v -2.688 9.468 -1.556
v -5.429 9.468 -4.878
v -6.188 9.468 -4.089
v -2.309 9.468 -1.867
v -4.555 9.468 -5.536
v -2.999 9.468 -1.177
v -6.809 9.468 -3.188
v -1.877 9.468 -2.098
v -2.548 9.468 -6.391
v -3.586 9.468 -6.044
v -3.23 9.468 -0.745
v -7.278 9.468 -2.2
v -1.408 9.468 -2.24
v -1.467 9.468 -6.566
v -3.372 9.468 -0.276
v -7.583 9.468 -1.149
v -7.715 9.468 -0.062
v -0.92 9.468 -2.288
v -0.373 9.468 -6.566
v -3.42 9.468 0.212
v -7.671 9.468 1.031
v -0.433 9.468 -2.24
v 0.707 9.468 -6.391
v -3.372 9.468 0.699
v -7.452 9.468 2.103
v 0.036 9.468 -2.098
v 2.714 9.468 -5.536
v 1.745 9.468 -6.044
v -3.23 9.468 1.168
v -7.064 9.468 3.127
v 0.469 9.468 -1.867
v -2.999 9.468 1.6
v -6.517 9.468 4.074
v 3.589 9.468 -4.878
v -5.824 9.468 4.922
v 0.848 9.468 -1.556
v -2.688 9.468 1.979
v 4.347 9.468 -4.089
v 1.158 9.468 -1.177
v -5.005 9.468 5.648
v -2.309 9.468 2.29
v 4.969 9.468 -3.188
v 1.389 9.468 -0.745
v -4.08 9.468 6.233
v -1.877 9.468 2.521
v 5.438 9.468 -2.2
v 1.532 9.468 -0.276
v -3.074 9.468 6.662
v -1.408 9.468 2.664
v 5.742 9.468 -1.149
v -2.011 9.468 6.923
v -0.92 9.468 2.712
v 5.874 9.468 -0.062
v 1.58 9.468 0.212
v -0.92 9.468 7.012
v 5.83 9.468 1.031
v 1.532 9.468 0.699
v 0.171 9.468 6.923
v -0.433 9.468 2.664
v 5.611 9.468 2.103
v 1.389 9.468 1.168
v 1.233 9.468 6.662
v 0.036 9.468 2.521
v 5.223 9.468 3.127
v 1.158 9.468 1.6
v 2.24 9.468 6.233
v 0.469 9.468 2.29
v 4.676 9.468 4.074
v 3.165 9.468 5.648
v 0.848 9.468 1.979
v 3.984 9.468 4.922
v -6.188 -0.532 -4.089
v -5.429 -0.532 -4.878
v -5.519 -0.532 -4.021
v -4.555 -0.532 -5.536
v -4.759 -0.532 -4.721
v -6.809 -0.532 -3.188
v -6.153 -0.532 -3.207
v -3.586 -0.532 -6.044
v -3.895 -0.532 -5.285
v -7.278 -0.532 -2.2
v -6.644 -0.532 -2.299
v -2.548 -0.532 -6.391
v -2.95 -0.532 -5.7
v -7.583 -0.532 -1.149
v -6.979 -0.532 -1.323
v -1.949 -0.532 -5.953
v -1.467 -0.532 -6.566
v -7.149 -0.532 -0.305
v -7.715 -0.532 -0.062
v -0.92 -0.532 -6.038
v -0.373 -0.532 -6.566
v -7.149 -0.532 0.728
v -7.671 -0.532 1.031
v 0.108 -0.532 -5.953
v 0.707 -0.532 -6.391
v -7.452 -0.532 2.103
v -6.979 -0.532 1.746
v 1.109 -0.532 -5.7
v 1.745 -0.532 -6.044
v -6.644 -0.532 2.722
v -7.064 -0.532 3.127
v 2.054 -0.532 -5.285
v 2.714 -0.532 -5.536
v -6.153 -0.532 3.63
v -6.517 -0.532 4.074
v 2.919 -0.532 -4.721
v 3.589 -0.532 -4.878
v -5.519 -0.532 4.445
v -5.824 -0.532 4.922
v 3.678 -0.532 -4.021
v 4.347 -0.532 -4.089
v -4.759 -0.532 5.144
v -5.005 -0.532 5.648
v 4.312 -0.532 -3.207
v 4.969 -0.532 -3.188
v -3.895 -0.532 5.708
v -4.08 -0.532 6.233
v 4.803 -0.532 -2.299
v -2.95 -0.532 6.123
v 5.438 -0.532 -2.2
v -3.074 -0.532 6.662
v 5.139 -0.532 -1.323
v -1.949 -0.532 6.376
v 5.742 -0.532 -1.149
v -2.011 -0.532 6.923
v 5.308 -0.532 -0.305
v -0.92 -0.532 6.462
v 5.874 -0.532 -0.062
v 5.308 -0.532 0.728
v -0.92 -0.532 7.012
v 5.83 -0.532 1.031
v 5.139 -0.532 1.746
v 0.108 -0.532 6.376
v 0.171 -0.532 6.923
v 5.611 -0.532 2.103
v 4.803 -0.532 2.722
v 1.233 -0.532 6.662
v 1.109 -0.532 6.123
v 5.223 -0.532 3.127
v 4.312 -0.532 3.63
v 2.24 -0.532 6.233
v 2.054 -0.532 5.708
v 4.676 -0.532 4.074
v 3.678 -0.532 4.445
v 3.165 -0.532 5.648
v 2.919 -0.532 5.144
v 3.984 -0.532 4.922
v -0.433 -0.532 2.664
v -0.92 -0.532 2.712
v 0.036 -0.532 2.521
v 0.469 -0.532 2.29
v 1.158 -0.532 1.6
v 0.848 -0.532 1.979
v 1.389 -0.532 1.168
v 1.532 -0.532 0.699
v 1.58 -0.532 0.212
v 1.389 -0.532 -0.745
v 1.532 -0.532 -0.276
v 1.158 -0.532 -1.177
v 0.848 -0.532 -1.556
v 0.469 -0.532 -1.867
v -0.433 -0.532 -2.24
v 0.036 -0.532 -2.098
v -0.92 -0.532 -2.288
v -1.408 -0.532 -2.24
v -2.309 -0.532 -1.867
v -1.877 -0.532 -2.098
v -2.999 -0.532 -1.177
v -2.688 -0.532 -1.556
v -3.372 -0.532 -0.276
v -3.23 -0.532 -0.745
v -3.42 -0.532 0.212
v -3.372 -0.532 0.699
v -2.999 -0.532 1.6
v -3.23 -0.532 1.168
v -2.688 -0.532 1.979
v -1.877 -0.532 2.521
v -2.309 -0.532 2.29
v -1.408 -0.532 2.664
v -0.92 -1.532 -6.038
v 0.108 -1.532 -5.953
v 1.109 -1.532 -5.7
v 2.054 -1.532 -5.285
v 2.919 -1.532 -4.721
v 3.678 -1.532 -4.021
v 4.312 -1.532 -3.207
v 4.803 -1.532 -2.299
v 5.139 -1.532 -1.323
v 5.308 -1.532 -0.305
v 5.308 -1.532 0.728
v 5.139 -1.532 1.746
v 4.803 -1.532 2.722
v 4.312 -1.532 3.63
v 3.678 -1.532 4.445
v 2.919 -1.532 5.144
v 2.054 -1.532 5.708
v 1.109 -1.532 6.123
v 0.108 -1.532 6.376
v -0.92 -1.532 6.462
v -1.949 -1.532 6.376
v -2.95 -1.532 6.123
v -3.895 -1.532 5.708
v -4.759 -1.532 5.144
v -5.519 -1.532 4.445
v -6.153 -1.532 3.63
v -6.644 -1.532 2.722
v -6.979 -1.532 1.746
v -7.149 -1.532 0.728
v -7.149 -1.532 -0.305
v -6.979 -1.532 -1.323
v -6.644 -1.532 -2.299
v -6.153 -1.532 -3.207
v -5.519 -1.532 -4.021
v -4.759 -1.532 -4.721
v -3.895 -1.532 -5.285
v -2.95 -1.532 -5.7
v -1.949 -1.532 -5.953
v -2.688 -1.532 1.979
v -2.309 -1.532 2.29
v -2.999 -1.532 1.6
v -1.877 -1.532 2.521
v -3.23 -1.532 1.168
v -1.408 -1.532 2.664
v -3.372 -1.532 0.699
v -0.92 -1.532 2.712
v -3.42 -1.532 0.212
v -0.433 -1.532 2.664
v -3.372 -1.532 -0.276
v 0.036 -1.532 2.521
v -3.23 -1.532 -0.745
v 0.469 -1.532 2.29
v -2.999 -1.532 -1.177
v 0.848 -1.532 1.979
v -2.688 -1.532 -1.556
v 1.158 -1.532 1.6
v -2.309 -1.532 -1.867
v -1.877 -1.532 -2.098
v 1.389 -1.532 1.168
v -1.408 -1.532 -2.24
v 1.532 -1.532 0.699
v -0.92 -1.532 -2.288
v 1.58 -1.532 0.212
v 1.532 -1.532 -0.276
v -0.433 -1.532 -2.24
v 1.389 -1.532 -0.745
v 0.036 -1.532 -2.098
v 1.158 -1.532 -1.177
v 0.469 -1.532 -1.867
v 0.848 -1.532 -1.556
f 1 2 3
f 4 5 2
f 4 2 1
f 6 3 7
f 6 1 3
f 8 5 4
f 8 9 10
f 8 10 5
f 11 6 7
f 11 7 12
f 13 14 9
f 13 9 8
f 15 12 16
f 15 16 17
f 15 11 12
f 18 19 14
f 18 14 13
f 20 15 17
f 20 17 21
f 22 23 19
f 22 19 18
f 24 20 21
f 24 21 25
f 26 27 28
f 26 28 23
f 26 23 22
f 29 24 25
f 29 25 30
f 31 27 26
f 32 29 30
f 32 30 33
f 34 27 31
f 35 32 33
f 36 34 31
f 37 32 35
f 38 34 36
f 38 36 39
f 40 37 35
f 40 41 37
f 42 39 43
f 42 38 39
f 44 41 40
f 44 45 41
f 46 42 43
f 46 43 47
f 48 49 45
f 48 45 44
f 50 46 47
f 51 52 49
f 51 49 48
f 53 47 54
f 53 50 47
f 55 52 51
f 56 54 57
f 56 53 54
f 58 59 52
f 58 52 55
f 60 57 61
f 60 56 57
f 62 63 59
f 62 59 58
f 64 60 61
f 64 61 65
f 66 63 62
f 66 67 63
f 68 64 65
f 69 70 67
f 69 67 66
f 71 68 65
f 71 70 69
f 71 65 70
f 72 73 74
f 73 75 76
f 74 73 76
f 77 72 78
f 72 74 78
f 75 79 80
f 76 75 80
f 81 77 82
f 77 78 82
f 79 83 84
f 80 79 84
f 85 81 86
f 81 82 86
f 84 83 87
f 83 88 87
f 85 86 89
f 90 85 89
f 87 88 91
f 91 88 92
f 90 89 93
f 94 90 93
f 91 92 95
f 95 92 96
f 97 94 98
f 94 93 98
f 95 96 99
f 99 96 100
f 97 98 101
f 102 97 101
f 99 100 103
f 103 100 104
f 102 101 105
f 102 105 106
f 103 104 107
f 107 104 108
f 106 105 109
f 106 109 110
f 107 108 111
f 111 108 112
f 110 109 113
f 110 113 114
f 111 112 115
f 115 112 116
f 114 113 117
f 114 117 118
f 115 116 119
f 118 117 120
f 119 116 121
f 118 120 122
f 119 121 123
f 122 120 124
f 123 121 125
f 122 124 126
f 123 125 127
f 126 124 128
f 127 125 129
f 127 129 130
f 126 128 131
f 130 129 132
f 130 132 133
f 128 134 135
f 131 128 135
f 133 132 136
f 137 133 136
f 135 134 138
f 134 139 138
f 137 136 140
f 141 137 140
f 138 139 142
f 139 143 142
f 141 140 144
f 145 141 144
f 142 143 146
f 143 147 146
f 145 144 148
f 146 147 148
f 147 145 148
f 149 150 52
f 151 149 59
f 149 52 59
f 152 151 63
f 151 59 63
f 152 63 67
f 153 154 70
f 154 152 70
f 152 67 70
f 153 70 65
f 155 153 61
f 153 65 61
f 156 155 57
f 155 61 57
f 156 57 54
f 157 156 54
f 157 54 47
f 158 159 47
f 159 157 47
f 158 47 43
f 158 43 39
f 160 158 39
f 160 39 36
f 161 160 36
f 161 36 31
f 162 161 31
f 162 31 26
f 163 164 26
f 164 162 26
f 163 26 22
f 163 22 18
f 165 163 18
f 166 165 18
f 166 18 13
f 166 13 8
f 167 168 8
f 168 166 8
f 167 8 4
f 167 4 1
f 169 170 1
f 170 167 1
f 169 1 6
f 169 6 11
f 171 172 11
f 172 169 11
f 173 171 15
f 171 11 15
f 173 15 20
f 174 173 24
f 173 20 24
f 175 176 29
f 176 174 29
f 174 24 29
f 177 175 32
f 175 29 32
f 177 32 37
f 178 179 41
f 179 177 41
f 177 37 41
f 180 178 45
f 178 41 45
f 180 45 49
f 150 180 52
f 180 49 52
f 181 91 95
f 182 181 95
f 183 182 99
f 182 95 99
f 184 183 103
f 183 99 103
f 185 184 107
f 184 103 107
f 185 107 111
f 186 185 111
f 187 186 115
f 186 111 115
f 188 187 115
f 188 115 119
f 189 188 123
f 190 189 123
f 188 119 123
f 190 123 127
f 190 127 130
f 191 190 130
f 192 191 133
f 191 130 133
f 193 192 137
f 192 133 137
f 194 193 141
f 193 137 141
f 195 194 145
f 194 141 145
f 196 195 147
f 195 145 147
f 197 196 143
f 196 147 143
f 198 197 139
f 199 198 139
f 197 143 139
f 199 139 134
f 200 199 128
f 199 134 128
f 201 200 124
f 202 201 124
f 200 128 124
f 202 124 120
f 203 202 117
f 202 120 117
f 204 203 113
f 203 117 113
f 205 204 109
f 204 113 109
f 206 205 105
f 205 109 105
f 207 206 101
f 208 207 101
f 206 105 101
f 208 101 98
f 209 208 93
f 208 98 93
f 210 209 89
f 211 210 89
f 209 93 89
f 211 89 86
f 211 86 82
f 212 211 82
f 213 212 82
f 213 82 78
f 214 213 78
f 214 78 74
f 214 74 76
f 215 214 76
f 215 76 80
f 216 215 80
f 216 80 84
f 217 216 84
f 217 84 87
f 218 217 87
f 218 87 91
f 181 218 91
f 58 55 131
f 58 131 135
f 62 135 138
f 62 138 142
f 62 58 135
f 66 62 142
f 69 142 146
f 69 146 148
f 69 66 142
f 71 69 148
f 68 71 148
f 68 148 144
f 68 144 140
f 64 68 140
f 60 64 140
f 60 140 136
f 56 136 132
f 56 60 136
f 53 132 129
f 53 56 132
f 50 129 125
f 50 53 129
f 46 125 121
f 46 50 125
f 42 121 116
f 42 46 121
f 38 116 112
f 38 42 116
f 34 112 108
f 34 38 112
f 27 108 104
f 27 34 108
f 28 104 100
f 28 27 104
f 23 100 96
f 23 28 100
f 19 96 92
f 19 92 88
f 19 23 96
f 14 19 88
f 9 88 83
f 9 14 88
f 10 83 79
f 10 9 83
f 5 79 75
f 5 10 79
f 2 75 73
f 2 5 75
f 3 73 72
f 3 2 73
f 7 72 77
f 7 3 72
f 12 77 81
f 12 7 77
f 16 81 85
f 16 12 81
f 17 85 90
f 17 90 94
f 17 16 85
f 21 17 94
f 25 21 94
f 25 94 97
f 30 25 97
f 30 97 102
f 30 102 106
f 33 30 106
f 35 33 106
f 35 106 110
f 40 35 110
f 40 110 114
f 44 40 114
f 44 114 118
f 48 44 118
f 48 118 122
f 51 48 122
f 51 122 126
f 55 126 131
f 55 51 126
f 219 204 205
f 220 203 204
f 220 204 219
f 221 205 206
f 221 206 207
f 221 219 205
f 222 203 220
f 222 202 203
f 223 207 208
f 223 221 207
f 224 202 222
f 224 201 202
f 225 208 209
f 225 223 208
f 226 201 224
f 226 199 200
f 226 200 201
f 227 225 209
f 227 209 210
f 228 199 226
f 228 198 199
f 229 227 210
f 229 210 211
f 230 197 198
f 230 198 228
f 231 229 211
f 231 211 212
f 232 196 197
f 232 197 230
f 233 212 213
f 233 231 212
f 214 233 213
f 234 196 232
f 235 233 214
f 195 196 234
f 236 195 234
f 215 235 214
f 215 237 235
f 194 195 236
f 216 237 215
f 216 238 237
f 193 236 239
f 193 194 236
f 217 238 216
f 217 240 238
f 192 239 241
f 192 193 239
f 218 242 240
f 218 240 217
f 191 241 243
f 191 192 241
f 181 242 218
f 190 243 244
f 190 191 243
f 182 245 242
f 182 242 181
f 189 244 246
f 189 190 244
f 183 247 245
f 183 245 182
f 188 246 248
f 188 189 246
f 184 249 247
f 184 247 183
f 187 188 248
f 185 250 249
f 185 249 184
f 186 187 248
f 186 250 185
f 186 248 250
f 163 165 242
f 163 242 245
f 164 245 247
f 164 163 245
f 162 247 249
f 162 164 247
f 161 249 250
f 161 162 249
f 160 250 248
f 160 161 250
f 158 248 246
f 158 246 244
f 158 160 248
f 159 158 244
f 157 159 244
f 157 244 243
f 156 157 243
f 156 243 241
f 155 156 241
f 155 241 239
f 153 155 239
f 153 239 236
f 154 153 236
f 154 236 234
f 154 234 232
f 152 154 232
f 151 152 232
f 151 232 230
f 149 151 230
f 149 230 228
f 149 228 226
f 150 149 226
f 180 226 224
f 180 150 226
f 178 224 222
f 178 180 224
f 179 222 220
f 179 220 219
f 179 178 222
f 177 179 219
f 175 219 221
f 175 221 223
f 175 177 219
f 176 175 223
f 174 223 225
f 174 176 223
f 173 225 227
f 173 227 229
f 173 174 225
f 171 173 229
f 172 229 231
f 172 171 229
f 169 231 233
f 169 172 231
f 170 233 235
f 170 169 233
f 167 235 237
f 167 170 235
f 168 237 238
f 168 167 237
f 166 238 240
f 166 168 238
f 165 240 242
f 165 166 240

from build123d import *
from build123d.topology import SkipClean

# Parameters (mm, degrees)
SKETCH_2_R      = 6.25
SKETCH_2_R_2    = 2.5
EXTRUDE_1_DEPTH = 1
EXTRUDE_START   = 10
SKETCH_3_R      = 6.8
SKETCH_3_R_2    = 2.5
EXTRUDE_2_DEPTH = 10


with BuildPart() as part:
    # Эскиз2 → Бобышка-Вытянуть1 (new body)
    with BuildSketch(Plane.XZ.offset(0.531623013)):
        with Locations(Location((-0.920226727, 0.211554027, 0), (0, 0, 270))):
            Circle(SKETCH_2_R)
        with Locations(Location((-0.920226727, 0.211554027, 0), (0, 0, 270))):
            Circle(SKETCH_2_R_2, mode=Mode.SUBTRACT)
    extrude(amount=EXTRUDE_1_DEPTH)

    # Эскиз3 → Бобышка-Вытянуть2 (add)
    with SkipClean():  # the faces are left unmerged after this step: merging them gives an invalid solid
        with BuildSketch(Plane(origin=(0, -0.531623013, 0), x_dir=(1, 0, 0), z_dir=(0, 1, 0)).offset(EXTRUDE_START)):
            with Locations(Location((-0.920226727, -0.211554027, 0), (0, 0, 270))):
                Circle(SKETCH_3_R)
            with Locations(Location((-0.920226727, -0.211554027, 0), (0, 0, 270))):
                Circle(SKETCH_3_R_2, mode=Mode.SUBTRACT)
        extrude(amount=-EXTRUDE_2_DEPTH)


solid = part.part
